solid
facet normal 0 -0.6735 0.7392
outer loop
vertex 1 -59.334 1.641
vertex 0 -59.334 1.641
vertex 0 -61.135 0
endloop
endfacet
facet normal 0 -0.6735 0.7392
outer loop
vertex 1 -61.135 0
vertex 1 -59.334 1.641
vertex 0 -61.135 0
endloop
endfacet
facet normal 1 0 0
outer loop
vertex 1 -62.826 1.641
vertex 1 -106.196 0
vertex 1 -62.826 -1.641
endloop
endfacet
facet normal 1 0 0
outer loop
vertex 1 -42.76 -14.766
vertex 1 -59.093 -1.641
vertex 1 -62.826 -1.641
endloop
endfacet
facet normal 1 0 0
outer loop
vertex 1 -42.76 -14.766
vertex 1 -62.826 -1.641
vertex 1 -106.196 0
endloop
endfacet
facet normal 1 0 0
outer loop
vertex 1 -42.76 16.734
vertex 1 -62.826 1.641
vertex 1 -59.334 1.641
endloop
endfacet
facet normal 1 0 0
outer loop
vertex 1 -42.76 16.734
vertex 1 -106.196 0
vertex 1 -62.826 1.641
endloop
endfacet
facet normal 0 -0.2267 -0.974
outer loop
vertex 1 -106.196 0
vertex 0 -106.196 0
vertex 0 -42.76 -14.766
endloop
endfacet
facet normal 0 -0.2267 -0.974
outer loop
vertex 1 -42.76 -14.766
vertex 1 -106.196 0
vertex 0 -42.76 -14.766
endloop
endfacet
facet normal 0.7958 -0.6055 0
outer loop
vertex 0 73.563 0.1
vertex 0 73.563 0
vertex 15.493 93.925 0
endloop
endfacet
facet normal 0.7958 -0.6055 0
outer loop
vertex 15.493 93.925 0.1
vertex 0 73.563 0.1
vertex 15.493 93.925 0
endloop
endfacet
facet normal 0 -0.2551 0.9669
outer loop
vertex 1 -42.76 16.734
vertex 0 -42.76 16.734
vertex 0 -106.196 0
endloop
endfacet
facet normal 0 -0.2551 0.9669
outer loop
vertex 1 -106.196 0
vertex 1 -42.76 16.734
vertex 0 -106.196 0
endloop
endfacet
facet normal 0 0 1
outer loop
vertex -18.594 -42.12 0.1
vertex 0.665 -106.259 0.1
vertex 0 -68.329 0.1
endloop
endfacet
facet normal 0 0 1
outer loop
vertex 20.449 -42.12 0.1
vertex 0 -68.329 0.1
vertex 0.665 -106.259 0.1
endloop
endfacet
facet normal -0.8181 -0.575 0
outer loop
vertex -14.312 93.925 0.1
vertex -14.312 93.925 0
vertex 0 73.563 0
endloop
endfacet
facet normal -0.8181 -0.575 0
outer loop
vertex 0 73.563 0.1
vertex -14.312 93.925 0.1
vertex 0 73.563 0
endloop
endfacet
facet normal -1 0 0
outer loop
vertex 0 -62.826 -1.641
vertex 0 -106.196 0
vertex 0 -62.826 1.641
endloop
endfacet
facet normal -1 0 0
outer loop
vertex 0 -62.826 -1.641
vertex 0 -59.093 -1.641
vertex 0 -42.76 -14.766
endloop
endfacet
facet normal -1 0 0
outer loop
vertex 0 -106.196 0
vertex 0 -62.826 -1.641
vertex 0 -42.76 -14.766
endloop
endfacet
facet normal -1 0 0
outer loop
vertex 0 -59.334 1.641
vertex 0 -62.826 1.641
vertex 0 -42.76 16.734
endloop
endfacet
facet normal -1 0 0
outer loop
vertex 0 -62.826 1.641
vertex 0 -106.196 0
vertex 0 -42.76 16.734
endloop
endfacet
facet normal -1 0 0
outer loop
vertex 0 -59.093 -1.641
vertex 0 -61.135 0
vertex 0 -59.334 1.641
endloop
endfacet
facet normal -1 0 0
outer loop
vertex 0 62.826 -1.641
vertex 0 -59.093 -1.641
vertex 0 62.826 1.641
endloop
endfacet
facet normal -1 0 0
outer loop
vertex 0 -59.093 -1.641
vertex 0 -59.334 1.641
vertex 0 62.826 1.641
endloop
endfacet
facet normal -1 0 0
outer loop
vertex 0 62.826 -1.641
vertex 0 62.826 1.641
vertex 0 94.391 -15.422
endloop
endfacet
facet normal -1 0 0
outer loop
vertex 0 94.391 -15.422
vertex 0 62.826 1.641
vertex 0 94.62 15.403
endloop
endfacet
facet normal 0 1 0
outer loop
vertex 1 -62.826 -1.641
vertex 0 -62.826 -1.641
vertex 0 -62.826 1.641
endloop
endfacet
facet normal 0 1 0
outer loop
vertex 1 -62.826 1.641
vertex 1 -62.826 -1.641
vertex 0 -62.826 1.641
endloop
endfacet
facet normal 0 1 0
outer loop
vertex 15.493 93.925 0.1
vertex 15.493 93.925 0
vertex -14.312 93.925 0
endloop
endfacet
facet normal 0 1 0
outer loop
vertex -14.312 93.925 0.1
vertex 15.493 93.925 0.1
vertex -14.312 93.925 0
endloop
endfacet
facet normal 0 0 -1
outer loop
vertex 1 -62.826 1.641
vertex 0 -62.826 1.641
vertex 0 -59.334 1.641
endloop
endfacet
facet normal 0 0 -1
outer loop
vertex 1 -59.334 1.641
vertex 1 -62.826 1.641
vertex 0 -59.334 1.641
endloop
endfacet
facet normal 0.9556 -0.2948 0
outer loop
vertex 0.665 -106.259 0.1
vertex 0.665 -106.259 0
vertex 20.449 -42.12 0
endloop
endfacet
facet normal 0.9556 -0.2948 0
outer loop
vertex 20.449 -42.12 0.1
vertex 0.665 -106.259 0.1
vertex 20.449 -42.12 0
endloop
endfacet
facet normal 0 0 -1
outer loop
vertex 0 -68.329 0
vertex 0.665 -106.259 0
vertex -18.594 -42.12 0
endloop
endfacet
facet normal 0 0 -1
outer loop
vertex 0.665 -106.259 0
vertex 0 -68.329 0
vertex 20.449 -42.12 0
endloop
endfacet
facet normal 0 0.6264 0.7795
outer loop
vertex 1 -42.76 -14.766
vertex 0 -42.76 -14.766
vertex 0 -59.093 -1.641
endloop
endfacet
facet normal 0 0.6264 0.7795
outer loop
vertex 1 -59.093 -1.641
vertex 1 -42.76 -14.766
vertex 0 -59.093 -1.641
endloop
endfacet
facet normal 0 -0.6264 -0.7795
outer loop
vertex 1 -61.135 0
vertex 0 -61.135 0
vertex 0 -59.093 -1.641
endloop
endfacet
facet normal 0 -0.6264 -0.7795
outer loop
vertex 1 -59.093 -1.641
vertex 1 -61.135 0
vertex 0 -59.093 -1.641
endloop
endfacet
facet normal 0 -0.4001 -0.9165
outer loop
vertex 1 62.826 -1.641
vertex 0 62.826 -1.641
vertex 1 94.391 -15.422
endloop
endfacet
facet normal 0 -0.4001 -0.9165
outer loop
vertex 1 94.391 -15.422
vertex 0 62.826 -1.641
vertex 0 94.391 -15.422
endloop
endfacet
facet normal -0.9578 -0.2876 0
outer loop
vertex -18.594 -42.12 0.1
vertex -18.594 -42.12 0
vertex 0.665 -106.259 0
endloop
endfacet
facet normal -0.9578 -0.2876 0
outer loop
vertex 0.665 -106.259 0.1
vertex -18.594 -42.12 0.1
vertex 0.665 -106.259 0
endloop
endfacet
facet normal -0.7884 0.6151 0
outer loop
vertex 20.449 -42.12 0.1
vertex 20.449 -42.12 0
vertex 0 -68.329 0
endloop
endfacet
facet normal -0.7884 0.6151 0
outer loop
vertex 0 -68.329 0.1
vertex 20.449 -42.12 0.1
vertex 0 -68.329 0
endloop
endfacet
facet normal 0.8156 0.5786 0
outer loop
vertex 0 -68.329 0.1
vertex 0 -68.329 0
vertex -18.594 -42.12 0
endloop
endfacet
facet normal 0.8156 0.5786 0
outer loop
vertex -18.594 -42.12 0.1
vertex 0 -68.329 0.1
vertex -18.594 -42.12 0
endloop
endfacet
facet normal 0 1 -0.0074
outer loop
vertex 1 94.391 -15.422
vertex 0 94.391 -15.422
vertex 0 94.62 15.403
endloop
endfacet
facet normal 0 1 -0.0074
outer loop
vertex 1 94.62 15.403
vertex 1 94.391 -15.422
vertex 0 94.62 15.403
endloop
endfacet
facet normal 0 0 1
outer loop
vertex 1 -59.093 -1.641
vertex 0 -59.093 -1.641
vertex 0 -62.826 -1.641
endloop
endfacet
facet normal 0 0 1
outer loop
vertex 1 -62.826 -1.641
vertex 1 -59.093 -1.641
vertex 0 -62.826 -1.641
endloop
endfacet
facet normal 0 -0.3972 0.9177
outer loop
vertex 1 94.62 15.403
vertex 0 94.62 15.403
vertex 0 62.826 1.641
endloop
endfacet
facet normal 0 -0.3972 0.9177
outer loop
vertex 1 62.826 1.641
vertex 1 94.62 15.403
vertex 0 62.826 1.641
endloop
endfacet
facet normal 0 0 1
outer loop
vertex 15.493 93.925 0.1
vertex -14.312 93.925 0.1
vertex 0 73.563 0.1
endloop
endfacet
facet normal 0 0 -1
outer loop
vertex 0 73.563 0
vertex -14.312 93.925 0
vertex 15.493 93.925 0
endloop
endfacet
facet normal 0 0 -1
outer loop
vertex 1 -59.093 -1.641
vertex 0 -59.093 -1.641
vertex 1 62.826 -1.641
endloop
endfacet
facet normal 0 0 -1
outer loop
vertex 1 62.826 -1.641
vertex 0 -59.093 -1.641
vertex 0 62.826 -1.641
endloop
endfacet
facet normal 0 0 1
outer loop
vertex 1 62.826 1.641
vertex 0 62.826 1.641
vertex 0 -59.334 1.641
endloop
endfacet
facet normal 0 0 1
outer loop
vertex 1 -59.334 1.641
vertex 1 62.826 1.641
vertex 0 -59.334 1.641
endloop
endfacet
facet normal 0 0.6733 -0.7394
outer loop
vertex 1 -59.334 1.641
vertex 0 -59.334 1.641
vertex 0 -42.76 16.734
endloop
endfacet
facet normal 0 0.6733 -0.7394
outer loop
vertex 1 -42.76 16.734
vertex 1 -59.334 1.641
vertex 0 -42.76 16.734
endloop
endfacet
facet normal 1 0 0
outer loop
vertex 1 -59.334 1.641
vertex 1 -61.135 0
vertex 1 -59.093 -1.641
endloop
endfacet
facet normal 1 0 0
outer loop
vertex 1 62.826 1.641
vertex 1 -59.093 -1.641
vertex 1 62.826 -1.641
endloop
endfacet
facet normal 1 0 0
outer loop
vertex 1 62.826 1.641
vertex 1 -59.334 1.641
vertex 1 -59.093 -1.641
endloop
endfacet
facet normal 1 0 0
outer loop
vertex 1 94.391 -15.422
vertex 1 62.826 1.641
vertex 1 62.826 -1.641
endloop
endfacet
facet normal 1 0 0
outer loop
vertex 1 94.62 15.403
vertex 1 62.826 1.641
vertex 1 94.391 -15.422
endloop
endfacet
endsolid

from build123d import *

# Parameters (mm, degrees)
F1_DEPTH = 1
F3_DEPTH = 0.1


# Not quite as in the source:
# - a feature names something its author has since deleted; it is built from what else it names


with BuildPart() as f1:
    # F0 (on Right) → F1 (new body)
    with BuildSketch(Plane.YZ):
        Polygon((62.826286089, -1.6406250652), (62.826286089, 1.6406250652), (-59.3336690074, 1.6406250652), (-61.1351393163, 0), (-59.0934728905, -1.6406250652), align=None)
        Polygon((94.6203459122, 15.4029149351), (62.826286089, 1.6406250652), (62.826286089, -1.6406250652), (94.3906232715, -15.4218757525), align=None)
    extrude(amount=F1_DEPTH)


with BuildPart() as f1b:
    # F0 (on Right) → F1, piece 2 (new body)
    with BuildSketch(Plane.YZ):
        Polygon((-62.826286089, 1.6406250652), (-59.3336690074, 1.6406250652), (-42.7601411939, 16.7343765497), (-106.1958223581, 0), (-62.826286089, 0), align=None)
        Polygon((-42.7601411939, -14.7656258196), (-59.0934728905, -1.6406250652), (-62.826286089, -1.6406250652), (-62.826286089, 0), (-106.1958223581, 0), align=None)
    extrude(amount=F1_DEPTH)


with BuildPart() as f3:
    # F2 (on Top) → F3 (new body)
    with BuildSketch(Plane.XY):
        Polygon((20.4486493021, -42.1203821898), (0, -68.3291633233), (-18.5940028665, -42.1203821898), (0.6650799187, -106.2591299415), align=None)
    extrude(amount=F3_DEPTH)


with BuildPart() as f3b:
    # F2 (on Top) → F3, piece 2 (new body)
    with BuildSketch(Plane.XY):
        Polygon((-14.3123809248, 93.9247533679), (0, 73.5628083348), (15.492782928, 93.9247533679), align=None)
    extrude(amount=F3_DEPTH)


solid = Compound([f1.part, f1b.part, f3.part, f3b.part])
